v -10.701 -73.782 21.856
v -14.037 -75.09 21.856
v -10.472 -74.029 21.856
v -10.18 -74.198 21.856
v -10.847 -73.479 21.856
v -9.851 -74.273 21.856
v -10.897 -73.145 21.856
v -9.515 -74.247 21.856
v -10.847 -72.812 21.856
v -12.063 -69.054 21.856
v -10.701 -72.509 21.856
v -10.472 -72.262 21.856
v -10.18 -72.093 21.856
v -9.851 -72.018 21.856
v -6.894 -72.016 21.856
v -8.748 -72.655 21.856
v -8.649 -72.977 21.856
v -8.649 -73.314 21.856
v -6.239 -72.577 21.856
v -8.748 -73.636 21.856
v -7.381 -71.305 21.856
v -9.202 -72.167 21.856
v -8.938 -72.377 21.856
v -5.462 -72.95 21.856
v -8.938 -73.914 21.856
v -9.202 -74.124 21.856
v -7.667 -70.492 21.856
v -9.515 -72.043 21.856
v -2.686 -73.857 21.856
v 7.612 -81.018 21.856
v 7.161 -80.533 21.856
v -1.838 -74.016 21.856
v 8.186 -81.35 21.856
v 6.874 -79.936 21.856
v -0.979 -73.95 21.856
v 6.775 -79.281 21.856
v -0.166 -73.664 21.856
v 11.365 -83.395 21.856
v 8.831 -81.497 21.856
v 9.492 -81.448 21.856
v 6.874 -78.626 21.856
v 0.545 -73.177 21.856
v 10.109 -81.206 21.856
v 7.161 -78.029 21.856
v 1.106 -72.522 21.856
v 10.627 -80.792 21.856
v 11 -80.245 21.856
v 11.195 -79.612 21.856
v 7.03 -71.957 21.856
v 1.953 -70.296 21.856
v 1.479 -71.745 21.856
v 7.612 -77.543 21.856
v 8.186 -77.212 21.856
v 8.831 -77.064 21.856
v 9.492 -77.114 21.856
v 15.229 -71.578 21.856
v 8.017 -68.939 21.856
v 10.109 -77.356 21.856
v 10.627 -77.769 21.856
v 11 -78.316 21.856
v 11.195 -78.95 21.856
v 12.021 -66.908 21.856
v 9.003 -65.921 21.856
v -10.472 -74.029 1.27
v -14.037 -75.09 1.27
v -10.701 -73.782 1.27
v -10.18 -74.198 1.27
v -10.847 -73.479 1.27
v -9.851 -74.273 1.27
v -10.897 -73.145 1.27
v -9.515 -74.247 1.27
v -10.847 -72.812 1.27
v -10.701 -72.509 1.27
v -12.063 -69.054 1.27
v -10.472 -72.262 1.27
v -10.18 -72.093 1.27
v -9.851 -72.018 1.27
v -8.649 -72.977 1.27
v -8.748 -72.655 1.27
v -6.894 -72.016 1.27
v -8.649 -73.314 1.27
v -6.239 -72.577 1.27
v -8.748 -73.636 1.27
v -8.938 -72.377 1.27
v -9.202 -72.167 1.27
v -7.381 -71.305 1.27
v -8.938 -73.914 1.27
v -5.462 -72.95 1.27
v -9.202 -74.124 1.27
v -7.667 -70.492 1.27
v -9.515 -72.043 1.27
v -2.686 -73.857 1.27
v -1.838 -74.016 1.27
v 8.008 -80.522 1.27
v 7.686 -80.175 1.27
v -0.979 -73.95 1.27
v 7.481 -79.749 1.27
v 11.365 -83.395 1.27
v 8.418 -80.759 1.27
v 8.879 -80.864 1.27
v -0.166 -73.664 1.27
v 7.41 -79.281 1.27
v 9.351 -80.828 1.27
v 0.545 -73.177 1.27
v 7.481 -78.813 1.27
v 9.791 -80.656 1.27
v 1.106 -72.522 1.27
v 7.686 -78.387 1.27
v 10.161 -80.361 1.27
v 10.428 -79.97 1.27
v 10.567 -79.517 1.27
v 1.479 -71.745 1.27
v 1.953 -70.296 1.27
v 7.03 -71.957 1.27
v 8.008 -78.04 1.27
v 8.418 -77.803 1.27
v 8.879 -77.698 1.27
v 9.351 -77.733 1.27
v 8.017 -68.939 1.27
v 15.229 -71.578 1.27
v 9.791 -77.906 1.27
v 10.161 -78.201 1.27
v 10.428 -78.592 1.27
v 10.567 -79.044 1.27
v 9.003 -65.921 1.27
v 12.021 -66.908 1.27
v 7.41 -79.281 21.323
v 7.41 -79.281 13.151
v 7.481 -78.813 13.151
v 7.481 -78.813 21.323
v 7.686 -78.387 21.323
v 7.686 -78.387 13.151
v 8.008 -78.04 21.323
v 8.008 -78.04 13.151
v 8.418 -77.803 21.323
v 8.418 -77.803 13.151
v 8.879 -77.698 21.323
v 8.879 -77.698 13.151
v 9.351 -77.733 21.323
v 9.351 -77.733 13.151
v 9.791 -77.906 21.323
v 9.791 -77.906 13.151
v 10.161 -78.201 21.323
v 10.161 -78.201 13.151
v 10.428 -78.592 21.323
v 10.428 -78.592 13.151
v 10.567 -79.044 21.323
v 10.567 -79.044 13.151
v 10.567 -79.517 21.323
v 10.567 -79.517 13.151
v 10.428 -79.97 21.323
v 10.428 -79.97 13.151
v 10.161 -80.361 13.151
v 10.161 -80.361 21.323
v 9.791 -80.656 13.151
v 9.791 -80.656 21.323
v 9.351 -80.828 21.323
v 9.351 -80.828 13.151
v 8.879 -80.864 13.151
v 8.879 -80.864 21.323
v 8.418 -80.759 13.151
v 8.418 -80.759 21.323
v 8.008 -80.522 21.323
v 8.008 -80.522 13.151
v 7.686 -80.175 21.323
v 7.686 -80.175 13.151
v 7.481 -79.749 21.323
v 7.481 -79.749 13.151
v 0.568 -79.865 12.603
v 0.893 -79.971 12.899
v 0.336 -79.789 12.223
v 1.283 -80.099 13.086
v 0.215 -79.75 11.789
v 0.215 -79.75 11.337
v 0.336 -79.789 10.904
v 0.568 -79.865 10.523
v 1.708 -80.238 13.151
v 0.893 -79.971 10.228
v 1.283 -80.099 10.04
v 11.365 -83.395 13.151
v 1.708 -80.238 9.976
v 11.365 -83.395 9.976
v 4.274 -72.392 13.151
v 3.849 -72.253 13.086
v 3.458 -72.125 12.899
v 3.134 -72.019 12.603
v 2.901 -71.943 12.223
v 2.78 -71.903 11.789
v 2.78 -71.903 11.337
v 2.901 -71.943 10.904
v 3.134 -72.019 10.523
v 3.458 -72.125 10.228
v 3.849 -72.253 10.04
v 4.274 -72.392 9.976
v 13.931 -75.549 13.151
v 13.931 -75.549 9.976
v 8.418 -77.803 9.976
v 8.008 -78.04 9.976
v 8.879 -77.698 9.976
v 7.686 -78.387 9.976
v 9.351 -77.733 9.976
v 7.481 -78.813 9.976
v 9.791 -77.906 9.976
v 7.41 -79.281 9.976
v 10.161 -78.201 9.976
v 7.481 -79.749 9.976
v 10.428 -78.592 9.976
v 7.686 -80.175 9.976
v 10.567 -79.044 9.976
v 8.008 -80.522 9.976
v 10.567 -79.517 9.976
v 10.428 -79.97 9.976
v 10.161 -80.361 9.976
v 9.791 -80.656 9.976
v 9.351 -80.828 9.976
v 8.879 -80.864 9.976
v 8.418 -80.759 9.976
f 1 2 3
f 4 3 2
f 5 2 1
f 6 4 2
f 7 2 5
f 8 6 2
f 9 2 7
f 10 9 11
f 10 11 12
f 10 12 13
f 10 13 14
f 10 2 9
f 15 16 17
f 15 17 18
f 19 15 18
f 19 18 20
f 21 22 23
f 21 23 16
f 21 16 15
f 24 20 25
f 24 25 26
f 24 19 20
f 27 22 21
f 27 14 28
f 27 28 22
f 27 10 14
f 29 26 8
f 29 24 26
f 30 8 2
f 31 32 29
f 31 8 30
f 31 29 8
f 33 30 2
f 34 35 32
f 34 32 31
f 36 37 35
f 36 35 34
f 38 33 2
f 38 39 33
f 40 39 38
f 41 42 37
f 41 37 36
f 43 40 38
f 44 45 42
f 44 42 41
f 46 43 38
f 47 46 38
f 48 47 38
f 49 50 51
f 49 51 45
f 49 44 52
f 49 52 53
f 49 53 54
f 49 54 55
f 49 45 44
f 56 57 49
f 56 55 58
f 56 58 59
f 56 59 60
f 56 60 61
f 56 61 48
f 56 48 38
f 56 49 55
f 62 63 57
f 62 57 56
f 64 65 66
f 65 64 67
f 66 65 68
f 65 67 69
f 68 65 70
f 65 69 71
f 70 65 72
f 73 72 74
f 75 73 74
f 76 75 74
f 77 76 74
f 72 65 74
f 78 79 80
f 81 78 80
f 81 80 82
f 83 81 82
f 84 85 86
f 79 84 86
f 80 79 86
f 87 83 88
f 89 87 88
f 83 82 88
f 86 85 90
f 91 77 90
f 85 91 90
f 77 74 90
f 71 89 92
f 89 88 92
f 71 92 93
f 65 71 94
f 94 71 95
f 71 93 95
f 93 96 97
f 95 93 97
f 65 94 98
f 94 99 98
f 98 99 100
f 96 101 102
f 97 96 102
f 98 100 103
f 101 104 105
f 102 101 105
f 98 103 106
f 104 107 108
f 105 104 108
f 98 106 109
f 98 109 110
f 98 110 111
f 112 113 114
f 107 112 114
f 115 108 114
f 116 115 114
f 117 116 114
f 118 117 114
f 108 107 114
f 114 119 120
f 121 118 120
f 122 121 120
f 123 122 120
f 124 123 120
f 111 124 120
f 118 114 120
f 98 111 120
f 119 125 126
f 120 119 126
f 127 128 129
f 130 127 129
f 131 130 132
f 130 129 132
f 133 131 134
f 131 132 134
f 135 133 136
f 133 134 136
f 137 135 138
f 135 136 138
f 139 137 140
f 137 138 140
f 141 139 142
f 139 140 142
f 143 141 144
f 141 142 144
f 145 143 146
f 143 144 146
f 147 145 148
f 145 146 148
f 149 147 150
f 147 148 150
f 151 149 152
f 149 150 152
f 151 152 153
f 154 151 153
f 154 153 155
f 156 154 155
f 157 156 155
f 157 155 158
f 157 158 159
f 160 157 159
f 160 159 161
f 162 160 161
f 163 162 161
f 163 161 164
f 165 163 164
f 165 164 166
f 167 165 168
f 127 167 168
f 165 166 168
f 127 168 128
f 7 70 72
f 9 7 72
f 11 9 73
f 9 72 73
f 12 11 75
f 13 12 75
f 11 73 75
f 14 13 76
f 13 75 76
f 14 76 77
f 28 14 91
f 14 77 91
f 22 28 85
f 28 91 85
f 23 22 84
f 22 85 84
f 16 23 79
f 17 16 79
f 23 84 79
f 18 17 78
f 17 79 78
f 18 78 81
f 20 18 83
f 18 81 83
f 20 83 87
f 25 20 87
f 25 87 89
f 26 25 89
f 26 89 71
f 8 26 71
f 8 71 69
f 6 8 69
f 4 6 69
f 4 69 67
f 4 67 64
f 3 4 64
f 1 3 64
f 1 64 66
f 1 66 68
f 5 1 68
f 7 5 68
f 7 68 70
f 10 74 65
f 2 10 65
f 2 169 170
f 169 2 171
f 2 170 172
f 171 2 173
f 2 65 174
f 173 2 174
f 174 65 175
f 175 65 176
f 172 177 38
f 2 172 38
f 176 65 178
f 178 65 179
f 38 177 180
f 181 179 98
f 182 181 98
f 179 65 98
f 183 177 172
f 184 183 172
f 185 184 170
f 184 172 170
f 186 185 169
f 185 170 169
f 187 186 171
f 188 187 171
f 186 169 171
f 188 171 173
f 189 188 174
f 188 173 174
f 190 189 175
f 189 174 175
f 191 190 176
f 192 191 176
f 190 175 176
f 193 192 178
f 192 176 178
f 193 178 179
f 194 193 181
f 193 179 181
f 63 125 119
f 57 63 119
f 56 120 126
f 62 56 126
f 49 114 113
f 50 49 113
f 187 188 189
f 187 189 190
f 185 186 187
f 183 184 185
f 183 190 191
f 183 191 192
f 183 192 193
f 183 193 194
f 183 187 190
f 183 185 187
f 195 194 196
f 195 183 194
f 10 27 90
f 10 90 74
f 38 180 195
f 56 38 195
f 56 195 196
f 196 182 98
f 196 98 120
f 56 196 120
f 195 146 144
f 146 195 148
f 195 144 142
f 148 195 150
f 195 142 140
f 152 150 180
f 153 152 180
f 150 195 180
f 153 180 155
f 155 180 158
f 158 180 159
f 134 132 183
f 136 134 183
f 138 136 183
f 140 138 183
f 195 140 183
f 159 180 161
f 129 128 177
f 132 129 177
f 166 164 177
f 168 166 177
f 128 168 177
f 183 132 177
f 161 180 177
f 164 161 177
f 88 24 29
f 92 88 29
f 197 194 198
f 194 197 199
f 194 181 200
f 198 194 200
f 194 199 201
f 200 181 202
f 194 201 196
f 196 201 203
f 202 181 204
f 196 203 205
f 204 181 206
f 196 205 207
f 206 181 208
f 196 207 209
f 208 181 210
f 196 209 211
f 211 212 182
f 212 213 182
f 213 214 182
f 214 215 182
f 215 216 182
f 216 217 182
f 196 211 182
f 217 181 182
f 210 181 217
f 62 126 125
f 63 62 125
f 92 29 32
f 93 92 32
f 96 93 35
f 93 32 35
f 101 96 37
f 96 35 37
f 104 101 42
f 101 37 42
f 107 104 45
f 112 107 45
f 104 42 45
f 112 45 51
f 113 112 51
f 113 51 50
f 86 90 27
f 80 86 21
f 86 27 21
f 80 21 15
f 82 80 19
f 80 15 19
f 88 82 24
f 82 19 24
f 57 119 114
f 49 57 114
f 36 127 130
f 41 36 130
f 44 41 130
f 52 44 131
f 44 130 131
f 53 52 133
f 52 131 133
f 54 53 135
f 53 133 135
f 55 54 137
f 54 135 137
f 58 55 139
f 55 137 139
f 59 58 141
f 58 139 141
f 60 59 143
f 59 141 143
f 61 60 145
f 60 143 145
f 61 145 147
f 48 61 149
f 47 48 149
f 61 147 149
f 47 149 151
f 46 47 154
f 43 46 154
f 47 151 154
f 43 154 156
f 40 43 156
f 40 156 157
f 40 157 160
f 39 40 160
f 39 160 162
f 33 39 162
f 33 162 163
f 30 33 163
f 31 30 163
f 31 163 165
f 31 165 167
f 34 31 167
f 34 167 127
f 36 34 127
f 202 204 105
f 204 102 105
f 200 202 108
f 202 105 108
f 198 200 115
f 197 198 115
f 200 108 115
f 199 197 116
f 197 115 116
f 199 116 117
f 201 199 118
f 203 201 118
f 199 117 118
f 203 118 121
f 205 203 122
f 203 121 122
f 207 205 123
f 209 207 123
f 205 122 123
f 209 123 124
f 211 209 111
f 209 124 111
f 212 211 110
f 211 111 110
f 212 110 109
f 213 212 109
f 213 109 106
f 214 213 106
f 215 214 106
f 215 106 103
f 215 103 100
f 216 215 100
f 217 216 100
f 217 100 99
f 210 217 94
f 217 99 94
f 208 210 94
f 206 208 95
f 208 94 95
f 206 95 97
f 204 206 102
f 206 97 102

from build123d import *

# Parameters (mm, degrees)
BOSS_EXTRUDE1_START                    = 1.27
BOSS_EXTRUDE1_DEPTH                    = 20.586143
F_4_40_TAPPED_HOLE1_D                  = 2.2606
F_1_8_0_125_DIAMETER_HOLE1_D           = 3.175
F_1_8_0_125_DIAMETER_HOLE1_CSINK_D     = 4.445
F_1_8_0_125_DIAMETER_HOLE1_CSINK_ANGLE = 100
CUT_EXTRUDE1_DEPTH                     = 8.255
CUT_EXTRUDE2_DEPTH                     = 21.586143296


with BuildPart() as part:
    # Sketch1 → Boss-Extrude1 (new body)
    with BuildSketch(Plane.XY.offset(BOSS_EXTRUDE1_START)):
        Polygon((8.016705611, -68.938838733), (7.029985744, -71.956620849), (0.99442151, -69.983181117), (0.007701644, -73.000963234), (-12.063426824, -69.054083768), (-14.036866557, -75.089648002), (11.365311403, -83.395361493), (15.229120806, -71.578294343), (12.021207594, -66.907776482), (9.003425477, -65.921056616), align=None)
    extrude(amount=BOSS_EXTRUDE1_DEPTH)

    # #4-40 Tapped Hole1 (through all)
    with Locations(Plane.XY.offset(21.856143296)):
        with Locations((-9.766799747, -73.145417099)):
            Hole(F_4_40_TAPPED_HOLE1_D / 2)

    # 1/8 (0.125) Diameter Hole1 (through all)
    with Locations(Plane.XY.offset(21.856143296)):
        with Locations((8.997580837, -79.280779556)):
            CounterSinkHole(F_1_8_0_125_DIAMETER_HOLE1_D / 2, F_1_8_0_125_DIAMETER_HOLE1_CSINK_D / 2, counter_sink_angle=F_1_8_0_125_DIAMETER_HOLE1_CSINK_ANGLE)

    # Sketch6 → Cut-Extrude1 (cut)
    with BuildSketch(Plane(origin=(-23.536376178, -71.983607041, 0), x_dir=(0.950482557, -0.310777911, 0), z_dir=(-0.310777911, -0.950482557, 0))):
        with BuildLine():
            Line((36.719966444, 13.150571648), (26.559966444, 13.150571648))
            ThreePointArc((26.559966444, 13.150571648), (24.972466444, 11.563071648), (26.559966444, 9.975571648))
            Line((26.559966444, 9.975571648), (36.719966444, 9.975571648))
            ThreePointArc((36.719966444, 9.975571648), (38.307466444, 11.563071648), (36.719966444, 13.150571648))
        make_face()
    extrude(amount=-CUT_EXTRUDE1_DEPTH, mode=Mode.SUBTRACT)

    # Sketch8 → Cut-Extrude2 (cut, through all)
    with BuildSketch(Plane.XY.offset(21.856143296)):
        with BuildLine():
            Line((-5.462102823, -72.94952157), (-2.685743275, -73.857303847))
            ThreePointArc((-2.685743275, -73.857303847), (-0.165929608, -73.663685373), (1.478938787, -71.744999106))
            ThreePointArc((1.478938787, -71.744999106), (1.632876898, -70.97000506), (1.598291814, -70.180627719))
            Line((1.598291814, -70.180627719), (0.99442151, -69.983181117))
            Line((0.99442151, -69.983181117), (0.007701644, -73.000963234))
            Line((0.007701644, -73.000963234), (-7.667023508, -70.491569419))
            ThreePointArc((-7.667023508, -70.491569419), (-6.893866312, -72.015948853), (-5.462102823, -72.94952157))
        make_face()
        with BuildLine():
            ThreePointArc((1.598291814, -70.180627719), (1.632876898, -70.97000506), (1.478938787, -71.744999106))
            Line((1.478938787, -71.744999106), (1.952564323, -70.29646369))
            Line((1.952564323, -70.29646369), (1.598291814, -70.180627719))
        make_face()
    extrude(amount=-CUT_EXTRUDE2_DEPTH, mode=Mode.SUBTRACT)


solid = part.part
